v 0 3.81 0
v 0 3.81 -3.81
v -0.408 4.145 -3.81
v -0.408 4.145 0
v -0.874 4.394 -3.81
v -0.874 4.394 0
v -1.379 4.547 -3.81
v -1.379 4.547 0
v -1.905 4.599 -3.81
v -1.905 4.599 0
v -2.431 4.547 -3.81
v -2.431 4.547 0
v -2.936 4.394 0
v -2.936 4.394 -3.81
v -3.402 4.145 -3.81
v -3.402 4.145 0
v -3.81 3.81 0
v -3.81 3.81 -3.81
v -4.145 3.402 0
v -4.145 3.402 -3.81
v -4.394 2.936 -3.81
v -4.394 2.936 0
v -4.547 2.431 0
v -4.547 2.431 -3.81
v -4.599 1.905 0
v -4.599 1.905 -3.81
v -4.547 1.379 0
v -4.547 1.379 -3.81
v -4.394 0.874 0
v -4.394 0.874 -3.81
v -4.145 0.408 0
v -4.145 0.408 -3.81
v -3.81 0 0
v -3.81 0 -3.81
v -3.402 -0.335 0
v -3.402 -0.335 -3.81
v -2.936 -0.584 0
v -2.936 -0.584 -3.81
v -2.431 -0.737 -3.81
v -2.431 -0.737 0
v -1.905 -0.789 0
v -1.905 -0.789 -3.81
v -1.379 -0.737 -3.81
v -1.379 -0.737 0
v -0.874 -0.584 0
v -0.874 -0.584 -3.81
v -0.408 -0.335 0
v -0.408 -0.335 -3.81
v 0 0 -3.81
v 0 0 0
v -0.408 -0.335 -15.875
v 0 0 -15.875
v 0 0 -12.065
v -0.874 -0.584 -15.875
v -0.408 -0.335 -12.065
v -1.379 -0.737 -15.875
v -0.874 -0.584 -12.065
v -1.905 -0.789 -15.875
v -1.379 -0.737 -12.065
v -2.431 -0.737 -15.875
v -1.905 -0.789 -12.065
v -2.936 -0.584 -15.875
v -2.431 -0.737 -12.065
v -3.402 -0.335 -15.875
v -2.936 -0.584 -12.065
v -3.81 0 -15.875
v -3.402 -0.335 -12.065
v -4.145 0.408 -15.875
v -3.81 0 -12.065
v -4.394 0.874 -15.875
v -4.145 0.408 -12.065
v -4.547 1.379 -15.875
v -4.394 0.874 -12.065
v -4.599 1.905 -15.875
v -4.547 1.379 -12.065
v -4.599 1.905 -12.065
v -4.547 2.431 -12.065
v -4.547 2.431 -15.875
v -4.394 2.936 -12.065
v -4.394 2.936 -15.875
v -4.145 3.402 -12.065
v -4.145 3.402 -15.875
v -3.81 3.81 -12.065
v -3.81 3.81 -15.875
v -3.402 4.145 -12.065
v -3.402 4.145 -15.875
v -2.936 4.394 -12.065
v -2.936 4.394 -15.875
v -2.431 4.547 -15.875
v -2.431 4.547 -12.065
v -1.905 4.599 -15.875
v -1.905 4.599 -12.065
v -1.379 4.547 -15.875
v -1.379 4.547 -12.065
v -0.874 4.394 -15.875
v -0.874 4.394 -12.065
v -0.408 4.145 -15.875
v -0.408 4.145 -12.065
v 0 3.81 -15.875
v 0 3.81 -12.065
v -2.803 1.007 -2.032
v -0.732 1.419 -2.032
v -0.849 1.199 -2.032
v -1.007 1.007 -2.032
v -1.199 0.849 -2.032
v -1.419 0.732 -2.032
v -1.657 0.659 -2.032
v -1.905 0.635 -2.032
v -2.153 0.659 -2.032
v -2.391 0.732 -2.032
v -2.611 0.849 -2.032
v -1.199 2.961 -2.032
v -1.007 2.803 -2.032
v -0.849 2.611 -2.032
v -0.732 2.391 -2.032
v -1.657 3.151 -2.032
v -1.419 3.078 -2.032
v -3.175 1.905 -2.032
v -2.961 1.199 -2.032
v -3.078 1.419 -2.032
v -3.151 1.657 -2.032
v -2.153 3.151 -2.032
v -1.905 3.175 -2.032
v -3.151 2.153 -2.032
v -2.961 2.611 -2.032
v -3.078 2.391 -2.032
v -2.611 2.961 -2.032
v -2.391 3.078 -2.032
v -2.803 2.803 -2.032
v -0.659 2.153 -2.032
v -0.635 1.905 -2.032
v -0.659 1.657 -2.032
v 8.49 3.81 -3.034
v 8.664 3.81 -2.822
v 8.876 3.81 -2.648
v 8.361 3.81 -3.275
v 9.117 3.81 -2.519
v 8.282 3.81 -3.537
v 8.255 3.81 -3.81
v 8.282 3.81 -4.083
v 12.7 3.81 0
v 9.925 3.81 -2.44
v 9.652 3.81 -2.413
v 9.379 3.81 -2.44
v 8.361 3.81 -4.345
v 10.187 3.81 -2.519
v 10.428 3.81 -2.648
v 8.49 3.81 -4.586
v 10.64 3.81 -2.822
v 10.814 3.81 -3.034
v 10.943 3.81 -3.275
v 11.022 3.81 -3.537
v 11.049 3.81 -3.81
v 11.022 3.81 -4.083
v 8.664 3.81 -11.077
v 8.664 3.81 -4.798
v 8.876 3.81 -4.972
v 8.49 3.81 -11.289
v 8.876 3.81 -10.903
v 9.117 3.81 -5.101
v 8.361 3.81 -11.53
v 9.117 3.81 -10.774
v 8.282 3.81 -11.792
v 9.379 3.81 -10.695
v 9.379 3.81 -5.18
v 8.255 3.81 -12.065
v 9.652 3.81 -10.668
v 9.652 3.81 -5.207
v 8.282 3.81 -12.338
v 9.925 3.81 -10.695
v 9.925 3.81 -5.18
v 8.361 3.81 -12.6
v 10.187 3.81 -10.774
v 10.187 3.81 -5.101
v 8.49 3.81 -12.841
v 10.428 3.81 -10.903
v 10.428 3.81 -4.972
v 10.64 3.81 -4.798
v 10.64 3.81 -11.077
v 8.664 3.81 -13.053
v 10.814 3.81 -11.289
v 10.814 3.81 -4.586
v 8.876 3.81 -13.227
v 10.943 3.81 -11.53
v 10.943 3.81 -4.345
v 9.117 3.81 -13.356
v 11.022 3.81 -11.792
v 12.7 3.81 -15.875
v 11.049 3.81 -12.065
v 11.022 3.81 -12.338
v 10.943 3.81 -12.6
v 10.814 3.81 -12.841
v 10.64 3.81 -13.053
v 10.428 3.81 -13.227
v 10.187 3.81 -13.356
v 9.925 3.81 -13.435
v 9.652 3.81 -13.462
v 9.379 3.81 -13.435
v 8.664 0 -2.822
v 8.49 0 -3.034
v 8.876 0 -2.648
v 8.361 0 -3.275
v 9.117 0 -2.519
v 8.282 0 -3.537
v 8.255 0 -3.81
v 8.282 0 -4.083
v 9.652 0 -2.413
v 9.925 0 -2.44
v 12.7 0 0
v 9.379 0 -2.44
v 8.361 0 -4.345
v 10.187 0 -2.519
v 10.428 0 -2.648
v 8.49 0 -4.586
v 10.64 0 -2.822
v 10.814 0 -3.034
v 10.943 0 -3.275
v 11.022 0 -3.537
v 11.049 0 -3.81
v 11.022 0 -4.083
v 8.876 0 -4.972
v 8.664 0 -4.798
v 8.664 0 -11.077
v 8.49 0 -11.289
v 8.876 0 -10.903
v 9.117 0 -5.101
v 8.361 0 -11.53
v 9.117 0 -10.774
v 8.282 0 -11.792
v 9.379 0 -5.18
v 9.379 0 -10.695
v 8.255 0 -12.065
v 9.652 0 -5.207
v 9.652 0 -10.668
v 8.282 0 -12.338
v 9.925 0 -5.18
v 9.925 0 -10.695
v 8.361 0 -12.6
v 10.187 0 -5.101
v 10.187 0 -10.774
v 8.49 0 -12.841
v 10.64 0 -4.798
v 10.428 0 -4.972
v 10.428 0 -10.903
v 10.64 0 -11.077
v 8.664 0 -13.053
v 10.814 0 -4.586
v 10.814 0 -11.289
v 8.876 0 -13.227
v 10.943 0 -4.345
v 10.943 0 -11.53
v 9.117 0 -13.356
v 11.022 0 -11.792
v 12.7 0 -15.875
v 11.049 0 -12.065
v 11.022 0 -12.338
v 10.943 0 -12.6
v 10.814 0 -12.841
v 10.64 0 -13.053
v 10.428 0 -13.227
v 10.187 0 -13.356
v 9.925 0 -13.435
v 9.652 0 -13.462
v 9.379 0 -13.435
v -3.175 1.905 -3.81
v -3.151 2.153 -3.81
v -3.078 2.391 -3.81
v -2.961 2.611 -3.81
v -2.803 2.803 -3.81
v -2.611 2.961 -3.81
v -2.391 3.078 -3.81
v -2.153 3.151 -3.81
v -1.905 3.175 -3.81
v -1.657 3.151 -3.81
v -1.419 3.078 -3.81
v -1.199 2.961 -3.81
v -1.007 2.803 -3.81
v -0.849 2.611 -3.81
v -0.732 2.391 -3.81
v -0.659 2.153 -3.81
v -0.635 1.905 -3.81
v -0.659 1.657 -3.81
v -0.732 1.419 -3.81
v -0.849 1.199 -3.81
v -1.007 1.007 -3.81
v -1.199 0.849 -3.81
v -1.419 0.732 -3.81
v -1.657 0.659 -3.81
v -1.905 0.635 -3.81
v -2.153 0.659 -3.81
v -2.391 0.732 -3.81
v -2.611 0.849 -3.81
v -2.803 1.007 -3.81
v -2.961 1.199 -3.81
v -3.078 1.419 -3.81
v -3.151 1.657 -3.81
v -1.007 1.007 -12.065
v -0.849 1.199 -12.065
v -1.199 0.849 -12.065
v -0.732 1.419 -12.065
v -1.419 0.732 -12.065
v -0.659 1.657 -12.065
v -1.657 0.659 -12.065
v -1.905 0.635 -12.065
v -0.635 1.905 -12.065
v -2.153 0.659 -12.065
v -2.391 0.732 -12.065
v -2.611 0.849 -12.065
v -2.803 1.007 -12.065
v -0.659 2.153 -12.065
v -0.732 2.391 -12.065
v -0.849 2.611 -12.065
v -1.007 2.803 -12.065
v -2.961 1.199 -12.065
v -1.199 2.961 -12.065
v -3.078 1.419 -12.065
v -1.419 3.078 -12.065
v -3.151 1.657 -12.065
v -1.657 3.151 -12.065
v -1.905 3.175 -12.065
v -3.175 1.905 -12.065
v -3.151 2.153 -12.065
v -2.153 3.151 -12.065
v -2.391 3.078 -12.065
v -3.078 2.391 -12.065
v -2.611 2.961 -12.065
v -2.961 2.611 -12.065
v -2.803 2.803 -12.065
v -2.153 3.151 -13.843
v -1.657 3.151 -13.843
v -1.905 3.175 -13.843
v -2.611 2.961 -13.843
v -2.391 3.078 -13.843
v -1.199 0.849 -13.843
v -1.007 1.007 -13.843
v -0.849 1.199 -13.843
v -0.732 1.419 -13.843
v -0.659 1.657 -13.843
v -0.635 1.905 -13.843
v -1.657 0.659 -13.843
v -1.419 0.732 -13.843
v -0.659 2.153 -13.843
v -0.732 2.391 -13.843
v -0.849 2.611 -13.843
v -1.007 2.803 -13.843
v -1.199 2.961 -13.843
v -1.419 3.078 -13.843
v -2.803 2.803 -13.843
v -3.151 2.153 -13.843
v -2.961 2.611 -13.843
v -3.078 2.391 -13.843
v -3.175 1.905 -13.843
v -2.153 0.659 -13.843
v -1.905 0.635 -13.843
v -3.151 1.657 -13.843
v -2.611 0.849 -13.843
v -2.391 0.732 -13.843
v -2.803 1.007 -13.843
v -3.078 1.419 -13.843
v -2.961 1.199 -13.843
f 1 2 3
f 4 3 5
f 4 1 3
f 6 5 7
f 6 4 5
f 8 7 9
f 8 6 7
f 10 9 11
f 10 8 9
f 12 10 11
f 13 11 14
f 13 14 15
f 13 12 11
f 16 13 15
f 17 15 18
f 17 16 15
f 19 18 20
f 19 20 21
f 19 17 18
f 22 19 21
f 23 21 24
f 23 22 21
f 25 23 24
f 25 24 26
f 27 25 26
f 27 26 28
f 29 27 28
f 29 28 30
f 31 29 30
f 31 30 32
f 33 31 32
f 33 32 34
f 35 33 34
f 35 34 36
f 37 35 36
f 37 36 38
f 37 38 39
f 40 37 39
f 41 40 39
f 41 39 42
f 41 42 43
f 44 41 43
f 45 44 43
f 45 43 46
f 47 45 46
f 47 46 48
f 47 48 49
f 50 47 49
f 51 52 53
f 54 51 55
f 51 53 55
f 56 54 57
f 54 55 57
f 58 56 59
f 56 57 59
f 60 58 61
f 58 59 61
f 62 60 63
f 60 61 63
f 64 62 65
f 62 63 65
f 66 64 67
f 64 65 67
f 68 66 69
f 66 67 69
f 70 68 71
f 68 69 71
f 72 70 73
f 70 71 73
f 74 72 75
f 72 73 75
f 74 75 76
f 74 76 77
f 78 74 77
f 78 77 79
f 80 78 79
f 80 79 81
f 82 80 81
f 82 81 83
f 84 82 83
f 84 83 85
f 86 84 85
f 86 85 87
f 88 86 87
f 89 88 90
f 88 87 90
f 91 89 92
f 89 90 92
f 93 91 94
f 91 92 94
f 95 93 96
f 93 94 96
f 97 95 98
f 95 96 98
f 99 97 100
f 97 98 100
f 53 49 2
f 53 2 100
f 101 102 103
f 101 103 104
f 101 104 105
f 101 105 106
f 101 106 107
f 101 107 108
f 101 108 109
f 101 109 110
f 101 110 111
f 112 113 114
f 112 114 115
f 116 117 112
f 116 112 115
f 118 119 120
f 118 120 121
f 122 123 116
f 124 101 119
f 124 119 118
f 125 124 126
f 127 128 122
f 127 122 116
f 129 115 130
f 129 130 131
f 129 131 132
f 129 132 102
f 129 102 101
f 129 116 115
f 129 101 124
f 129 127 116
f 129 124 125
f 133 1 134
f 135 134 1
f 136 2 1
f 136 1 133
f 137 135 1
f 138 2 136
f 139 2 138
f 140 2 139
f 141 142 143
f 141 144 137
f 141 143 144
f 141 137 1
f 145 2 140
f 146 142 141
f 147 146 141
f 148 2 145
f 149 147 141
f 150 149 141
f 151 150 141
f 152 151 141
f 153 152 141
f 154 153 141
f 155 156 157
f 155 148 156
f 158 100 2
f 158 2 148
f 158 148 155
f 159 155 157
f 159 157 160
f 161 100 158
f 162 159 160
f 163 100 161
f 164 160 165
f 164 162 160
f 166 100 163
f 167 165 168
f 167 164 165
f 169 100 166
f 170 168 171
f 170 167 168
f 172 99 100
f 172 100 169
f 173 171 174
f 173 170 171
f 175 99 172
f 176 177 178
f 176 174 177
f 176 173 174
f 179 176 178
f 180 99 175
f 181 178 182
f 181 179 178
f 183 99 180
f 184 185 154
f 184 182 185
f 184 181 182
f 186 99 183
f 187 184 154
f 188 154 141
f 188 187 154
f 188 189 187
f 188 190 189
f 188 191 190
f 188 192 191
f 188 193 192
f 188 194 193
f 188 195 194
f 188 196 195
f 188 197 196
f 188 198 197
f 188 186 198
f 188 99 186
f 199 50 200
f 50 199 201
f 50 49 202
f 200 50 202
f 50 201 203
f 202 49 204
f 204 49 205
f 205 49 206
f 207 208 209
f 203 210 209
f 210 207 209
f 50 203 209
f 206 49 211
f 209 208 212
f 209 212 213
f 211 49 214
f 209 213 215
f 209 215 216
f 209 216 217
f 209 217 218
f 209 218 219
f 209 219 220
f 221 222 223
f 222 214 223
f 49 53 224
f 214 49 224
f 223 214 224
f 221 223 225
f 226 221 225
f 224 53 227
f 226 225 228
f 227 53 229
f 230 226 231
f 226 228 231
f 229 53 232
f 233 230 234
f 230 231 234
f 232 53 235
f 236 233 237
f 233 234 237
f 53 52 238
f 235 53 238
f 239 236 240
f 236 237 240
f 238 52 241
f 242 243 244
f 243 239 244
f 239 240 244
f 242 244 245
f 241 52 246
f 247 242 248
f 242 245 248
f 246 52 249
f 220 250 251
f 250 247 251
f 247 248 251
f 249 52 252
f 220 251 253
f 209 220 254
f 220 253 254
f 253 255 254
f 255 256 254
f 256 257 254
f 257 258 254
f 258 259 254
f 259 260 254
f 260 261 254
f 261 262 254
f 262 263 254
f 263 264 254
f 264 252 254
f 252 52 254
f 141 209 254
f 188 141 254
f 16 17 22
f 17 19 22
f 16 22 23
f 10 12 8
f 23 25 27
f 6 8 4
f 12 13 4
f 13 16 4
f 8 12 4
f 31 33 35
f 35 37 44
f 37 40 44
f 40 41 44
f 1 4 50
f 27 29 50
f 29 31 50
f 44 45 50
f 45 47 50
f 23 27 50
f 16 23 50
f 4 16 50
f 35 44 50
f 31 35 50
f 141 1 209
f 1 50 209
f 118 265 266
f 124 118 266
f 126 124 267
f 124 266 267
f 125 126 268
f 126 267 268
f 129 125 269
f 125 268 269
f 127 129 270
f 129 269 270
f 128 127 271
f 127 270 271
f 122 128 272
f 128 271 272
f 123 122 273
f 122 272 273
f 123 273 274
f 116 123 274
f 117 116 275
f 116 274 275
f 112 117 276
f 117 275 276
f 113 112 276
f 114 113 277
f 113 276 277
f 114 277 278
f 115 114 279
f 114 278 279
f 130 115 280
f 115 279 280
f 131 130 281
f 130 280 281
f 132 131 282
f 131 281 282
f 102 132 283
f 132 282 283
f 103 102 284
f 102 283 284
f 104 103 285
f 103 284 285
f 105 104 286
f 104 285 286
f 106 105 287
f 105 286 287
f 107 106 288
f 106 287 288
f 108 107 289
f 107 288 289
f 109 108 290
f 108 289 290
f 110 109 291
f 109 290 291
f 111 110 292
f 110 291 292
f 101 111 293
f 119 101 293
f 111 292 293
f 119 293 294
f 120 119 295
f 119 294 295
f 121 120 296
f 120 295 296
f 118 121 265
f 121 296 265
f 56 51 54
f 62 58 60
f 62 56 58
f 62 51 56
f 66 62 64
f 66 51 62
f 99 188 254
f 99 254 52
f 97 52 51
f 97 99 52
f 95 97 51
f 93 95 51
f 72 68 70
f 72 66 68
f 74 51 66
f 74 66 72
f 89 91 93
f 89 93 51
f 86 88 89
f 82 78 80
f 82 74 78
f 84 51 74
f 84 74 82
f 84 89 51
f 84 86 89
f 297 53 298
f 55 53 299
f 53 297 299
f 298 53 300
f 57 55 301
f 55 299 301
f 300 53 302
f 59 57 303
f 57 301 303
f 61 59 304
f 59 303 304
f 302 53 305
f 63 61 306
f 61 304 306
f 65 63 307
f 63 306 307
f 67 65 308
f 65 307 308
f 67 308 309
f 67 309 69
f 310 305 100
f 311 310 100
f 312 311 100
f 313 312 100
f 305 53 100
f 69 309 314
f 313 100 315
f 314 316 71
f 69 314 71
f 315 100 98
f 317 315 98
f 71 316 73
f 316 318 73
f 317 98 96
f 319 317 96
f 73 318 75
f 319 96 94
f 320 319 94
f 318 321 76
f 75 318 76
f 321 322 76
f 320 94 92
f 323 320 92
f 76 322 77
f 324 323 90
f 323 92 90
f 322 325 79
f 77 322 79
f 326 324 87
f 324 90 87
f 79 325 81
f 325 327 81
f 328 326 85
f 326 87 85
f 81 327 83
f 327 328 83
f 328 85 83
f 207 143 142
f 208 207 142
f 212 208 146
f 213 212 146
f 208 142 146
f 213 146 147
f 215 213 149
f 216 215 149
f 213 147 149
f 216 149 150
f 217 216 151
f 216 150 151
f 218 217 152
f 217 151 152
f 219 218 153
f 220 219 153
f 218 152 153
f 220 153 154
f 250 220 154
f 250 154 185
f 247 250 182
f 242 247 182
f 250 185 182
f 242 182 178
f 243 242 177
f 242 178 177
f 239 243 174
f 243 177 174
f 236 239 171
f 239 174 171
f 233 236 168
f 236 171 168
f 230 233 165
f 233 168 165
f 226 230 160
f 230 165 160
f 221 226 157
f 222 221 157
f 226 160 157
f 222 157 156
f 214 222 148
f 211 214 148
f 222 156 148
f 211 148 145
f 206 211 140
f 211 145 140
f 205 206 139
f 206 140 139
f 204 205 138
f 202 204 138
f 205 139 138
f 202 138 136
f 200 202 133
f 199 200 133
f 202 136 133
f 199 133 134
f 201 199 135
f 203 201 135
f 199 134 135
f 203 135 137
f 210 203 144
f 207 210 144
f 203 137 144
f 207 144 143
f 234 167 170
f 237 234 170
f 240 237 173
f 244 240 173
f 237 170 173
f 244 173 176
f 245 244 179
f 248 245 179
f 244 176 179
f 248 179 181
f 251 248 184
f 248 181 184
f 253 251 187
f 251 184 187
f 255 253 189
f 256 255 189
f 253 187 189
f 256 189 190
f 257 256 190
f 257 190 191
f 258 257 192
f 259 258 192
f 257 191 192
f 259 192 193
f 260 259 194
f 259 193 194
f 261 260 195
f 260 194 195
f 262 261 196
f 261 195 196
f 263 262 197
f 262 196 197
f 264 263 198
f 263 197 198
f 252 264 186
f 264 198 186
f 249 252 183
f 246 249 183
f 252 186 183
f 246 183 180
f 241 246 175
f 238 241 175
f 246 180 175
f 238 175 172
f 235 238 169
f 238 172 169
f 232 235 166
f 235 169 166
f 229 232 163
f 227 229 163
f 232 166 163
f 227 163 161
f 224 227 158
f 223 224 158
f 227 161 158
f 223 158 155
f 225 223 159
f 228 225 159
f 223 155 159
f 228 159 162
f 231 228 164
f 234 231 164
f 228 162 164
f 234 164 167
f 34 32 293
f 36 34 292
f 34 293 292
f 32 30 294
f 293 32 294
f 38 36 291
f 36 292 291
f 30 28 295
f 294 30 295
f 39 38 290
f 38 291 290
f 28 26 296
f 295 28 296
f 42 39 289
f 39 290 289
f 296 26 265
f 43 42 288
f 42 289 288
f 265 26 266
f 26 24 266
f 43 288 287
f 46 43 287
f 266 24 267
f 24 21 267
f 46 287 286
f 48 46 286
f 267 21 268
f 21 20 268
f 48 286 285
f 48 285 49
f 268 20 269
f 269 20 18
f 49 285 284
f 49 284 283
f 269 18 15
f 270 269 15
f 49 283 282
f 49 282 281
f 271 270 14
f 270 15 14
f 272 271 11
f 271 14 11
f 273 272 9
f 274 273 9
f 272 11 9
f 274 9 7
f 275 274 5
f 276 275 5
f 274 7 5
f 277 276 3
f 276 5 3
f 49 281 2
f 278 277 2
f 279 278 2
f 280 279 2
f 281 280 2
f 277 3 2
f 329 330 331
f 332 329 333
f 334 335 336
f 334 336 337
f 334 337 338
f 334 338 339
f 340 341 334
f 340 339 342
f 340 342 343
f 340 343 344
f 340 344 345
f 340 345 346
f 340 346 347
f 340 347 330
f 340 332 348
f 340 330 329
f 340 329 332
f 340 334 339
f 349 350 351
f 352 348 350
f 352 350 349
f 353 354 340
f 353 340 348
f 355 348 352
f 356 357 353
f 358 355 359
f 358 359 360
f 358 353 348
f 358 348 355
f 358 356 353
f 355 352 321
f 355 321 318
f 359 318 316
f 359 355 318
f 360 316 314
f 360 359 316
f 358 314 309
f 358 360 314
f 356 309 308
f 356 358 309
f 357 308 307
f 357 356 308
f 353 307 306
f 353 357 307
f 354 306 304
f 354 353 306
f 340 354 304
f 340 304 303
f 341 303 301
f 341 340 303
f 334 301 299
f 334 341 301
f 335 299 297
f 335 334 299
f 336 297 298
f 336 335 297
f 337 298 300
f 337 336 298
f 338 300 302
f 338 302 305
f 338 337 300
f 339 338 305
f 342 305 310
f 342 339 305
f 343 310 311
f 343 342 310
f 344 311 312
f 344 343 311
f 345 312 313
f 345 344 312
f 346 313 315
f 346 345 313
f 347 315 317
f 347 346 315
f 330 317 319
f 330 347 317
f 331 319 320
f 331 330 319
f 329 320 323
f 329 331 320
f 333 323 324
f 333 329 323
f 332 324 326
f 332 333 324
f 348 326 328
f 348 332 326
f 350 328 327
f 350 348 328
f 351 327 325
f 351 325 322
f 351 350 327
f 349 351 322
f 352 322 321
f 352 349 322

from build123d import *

# Parameters (mm, degrees)
SKETCH2_W           = 12.7
SKETCH2_H           = 15.875
BOSS_EXTRUDE1_DEPTH = 3.81
SKETCH3_R           = 1.397
CUT_EXTRUDE1_DEPTH  = 3.81
SKETCH6_R           = 2.694076836
BOSS_EXTRUDE2_DEPTH = 3.81
SKETCH8_R           = 1.27
CUT_EXTRUDE3_DEPTH  = 1.778
BOSS_EXTRUDE3_START = -3.81
SKETCH9_R           = 2.694076836
BOSS_EXTRUDE3_DEPTH = 3.81
CUT_EXTRUDE4_START  = -1.778
SKETCH10_R          = 1.27
CUT_EXTRUDE4_DEPTH  = 1.778


with BuildPart() as part:
    # Sketch2 → Boss-Extrude1 (new body)
    with BuildSketch(Plane(origin=(0, 0, 0), x_dir=(1, 0, 0), z_dir=(0, 1, 0))):
        with Locations((6.35, 7.9375)):
            Rectangle(SKETCH2_W, SKETCH2_H)
    extrude(amount=BOSS_EXTRUDE1_DEPTH)

    # Sketch3 → Cut-Extrude1 (cut)
    with BuildSketch(Plane(origin=(0, 3.81, 0), x_dir=(1, 0, 0), z_dir=(0, 1, 0))):
        with Locations(Location((9.652, 3.81, 0), (0, 0, 270))):
            Circle(SKETCH3_R)
        with Locations(Location((9.652, 12.065, 0), (0, 0, 270))):
            Circle(SKETCH3_R)
    extrude(amount=-CUT_EXTRUDE1_DEPTH, mode=Mode.SUBTRACT)

    # Sketch6 → Boss-Extrude2 (add)
    with BuildSketch(Plane.XY):
        with Locations((-1.905, 1.905)):
            Circle(SKETCH6_R)
    extrude(amount=-BOSS_EXTRUDE2_DEPTH)

    # Sketch8 → Cut-Extrude3 (cut)
    with BuildSketch(Plane(origin=(0, 0, -3.81), x_dir=(-1, 0, 0), z_dir=(0, 0, -1))):
        with Locations((1.905, 1.905)):
            Circle(SKETCH8_R)
    extrude(amount=-CUT_EXTRUDE3_DEPTH, mode=Mode.SUBTRACT)

    # Sketch9 → Boss-Extrude3 (add)
    with BuildSketch(Plane(origin=(0, 0, -15.875), x_dir=(-1, 0, 0), z_dir=(0, 0, -1)).offset(BOSS_EXTRUDE3_START)):
        with Locations((1.905, 1.905)):
            Circle(SKETCH9_R)
    extrude(amount=BOSS_EXTRUDE3_DEPTH)

    # Sketch10 → Cut-Extrude4 (cut)
    with BuildSketch(Plane.XY.offset(-12.065).offset(CUT_EXTRUDE4_START)):
        with Locations(Location((-1.905, 1.905, 0), (0, 0, 180))):
            Circle(SKETCH10_R)
    extrude(amount=CUT_EXTRUDE4_DEPTH, mode=Mode.SUBTRACT)


solid = part.part
